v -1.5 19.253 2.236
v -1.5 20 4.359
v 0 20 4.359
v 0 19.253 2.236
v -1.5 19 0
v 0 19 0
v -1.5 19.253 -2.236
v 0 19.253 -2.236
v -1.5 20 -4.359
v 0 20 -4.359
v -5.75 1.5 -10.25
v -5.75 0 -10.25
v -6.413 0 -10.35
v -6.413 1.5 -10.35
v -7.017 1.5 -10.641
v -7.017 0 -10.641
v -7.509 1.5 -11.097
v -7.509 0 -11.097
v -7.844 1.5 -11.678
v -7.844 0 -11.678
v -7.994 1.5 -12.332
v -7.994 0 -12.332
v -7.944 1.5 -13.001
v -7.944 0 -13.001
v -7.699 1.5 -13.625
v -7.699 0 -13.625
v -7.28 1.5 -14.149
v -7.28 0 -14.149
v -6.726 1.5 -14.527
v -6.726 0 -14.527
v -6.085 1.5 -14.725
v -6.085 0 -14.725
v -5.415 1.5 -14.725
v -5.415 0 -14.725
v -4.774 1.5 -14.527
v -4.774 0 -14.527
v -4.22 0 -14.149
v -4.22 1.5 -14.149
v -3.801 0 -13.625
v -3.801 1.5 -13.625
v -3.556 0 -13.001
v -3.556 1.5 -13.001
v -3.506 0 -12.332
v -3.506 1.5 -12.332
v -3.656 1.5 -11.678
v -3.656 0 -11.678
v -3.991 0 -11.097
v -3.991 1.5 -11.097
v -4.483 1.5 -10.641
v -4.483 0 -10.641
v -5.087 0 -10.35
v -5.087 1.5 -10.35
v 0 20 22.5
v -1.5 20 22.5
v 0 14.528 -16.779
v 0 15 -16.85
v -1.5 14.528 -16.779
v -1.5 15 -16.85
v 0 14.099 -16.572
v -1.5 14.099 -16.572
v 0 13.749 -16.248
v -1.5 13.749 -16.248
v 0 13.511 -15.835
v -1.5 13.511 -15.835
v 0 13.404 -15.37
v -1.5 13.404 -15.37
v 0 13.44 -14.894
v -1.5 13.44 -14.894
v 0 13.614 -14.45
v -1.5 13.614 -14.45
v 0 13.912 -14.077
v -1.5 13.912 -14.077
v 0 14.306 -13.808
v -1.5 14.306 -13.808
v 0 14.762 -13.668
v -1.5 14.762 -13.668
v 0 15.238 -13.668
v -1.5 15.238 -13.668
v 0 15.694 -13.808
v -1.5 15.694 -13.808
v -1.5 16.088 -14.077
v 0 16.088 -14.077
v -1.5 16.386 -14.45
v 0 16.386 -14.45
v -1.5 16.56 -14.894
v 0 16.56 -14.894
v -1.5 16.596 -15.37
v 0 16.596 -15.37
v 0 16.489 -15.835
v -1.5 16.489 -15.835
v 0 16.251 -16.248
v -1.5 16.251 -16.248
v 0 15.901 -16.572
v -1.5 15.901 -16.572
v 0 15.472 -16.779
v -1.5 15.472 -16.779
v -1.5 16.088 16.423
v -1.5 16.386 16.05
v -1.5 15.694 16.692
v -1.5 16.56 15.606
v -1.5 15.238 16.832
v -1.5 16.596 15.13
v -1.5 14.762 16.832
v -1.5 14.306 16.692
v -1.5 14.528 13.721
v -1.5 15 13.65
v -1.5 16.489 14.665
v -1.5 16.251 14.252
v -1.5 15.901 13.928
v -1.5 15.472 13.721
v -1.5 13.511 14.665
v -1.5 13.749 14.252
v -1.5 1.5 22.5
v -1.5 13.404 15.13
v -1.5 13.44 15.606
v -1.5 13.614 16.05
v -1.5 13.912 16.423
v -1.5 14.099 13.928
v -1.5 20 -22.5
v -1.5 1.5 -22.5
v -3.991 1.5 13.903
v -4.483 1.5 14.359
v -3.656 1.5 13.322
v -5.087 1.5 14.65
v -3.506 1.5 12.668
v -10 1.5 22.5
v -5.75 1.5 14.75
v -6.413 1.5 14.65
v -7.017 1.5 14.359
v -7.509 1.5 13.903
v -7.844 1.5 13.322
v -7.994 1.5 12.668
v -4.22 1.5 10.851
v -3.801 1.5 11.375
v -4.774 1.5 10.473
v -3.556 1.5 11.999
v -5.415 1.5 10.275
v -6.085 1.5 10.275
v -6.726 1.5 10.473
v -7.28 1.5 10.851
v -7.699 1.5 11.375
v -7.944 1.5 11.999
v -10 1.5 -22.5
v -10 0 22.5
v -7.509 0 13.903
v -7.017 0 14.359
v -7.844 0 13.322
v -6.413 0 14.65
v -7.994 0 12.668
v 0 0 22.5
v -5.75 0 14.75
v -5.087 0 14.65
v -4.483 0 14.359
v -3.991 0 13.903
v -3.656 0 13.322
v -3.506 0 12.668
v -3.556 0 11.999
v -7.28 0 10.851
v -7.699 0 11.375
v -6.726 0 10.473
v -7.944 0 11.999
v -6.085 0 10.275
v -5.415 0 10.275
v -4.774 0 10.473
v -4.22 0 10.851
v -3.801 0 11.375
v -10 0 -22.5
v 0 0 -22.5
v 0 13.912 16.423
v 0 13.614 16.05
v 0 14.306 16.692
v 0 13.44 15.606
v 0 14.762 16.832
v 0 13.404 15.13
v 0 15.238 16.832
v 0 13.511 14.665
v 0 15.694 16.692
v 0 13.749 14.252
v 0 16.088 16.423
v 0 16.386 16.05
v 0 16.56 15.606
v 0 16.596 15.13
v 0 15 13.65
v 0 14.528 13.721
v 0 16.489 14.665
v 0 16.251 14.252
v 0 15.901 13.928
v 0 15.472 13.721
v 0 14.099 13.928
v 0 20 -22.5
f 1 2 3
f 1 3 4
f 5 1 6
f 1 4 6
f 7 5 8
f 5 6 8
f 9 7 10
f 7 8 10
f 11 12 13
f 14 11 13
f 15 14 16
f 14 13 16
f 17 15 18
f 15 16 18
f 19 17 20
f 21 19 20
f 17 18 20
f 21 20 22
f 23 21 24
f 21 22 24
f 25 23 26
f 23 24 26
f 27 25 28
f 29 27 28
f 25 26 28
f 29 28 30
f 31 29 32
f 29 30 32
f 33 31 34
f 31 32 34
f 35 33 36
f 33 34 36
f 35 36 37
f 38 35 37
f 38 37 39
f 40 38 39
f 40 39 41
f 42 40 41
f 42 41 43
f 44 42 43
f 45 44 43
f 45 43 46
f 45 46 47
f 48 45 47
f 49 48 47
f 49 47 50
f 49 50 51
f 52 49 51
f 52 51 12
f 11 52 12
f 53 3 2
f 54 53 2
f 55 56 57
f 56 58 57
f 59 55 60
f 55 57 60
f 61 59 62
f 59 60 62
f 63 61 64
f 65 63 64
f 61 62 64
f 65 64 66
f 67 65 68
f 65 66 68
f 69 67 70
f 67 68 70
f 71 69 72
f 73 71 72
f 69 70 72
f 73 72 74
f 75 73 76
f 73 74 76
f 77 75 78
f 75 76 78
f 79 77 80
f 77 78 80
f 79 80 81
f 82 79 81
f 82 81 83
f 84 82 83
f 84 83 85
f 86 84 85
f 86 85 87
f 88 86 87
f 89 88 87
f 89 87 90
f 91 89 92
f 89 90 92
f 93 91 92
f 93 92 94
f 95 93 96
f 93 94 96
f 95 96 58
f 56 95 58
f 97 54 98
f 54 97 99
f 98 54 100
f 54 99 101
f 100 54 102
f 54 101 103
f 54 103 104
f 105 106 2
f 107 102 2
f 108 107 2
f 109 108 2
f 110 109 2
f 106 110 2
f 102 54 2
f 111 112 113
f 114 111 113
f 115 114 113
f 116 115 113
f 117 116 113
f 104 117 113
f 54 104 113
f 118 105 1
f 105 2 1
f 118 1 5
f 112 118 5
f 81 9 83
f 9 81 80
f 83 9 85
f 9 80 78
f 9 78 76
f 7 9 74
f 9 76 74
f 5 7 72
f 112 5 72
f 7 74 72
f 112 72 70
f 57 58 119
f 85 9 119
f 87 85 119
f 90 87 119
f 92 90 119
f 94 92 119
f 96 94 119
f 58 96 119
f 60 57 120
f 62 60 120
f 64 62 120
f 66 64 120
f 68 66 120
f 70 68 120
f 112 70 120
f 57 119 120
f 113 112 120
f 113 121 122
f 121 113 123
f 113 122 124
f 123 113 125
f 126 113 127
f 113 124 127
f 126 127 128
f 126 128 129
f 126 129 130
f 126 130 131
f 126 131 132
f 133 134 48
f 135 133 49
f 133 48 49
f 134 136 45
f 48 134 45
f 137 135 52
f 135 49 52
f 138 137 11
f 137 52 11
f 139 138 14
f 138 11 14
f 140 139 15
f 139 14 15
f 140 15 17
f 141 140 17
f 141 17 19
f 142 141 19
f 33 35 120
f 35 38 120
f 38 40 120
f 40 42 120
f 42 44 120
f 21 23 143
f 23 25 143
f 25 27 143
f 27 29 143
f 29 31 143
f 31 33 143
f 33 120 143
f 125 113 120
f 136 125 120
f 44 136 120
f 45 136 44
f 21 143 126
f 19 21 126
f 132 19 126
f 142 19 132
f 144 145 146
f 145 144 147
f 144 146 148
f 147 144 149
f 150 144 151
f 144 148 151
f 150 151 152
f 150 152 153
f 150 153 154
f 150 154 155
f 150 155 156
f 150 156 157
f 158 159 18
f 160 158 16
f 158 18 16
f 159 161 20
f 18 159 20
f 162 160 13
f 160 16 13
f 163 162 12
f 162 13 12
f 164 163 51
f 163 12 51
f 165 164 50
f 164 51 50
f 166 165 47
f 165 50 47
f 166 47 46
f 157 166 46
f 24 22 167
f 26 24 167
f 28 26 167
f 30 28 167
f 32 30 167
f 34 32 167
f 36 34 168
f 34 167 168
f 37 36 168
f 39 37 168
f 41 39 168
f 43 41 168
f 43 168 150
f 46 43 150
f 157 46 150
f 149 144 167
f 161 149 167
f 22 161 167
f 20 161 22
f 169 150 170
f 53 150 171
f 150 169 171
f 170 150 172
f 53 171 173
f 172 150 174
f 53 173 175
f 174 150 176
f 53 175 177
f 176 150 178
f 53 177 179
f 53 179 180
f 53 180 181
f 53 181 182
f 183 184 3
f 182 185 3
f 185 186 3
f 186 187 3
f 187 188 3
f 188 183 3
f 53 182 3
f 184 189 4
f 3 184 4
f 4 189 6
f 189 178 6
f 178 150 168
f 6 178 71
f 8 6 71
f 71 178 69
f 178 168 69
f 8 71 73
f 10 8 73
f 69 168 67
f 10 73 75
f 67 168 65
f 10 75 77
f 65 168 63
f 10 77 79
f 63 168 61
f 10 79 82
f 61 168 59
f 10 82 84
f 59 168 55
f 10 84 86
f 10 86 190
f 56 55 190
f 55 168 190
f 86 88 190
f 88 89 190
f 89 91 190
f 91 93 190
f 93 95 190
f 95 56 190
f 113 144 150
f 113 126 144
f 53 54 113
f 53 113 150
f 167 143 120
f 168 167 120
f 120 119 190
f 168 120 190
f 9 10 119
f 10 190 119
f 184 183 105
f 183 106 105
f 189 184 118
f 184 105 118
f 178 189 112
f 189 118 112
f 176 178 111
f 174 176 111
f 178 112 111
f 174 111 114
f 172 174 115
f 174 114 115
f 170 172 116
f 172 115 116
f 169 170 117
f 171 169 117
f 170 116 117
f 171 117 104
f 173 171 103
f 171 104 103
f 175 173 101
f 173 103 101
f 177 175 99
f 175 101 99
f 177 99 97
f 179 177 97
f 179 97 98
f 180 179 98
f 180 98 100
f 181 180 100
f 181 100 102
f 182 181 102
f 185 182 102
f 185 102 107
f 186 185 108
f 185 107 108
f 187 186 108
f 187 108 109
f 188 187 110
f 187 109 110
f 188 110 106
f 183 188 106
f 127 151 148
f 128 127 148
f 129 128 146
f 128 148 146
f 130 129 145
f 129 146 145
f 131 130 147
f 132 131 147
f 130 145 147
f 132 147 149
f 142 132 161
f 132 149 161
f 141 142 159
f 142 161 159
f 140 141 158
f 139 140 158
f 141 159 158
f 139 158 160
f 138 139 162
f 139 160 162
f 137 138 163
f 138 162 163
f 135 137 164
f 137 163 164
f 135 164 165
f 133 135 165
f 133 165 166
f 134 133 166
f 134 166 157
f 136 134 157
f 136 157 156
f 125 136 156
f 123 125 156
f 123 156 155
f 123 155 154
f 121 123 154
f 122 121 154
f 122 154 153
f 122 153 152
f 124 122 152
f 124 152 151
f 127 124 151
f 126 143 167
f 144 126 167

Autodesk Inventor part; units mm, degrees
ref_plane "YZ Plane" through (0, 0, 0) normal (1, 0, 0) x (0, 1, 0)
ref_plane "XZ Plane" through (0, 0, 0) normal (0, 1, 0) x (-1, 0, 0)
ref_plane "XY Plane" through (0, 0, 0) normal (0, 0, 1) x (1, 0, 0)
sketch "Náčrt1" plane through (0, 0, 0) normal (0, 0, 1) x (1, 0, 0)
  line L0 (-10, 0) -> (0, 0)
  line L1 (0, 0) -> (0, 20)
  line L2 (0, 20) -> (-1.5, 20)
  line L3 (-1.5, 20) -> (-1.5, 1.5)
  line L4 (-1.5, 1.5) -> (-10, 1.5)
  line L5 (-10, 1.5) -> (-10, 0)
  line L6 (-12, 0) -> (2, 0) projected
  line L7 (0, 24) -> (0, -4) projected
  point P0 (0, 0)
  dimension "d0" = 20
  dimension "d1" = 10
  dimension "d2" = 1.5
  dimension "d3" = 1.5
extrude "Vysunutí1" add sketch "Náčrt1" along normal mid plane 45
sketch "Náčrt2" plane through (-10, 1.5, 22.5) normal (0, 1, 0) x (1, 0, 0)
  line L0 (0, 0) -> (0, 45) projected
  line L1 (8.5, 0) -> (0, 0) projected
  line L2 (8.5, 45) -> (8.5, 0) projected
  line L3 (0, 45) -> (8.5, 45) projected
  point P0 (10, 22.5)
  point P1 (4.25, 35)
  point P2 (4.25, 10)
  point P3 (4.25, 0)
  dimension "d6" = 4.25
  dimension "d7" = 4.25
  dimension "d8" = 25
  dimension "d9" = 10
hole "Díra1" at (-5.75, 1.5, -12.5) at (-5.75, 1.5, 12.5) direction (0, -1, 0) diameter 4.5 end through all
sketch "Náčrt5" plane through (0, 0, 22.5) normal (1, 0, 0) x (0, 0, -1)
  line L0 (45, 20) -> (0, 20) projected
  line L1 (0, 0) -> (0, 20) projected
  line L2 (45, 0) -> (0, 0) projected
  line L3 (45, 20) -> (45, 0) projected
  line L4 (22.5, 0) -> (22.5, 47.1534) construction
  point P0 (22.5, 20)
  point P1 (37.75, 15)
  point P2 (7.25, 15)
  dimension "d41" = 30.5
  dimension "d42" = 5
  dimension "d43" = 47.1534
hole "Díra4" at (0, 15, -15.25) at (0, 15, 15.25) direction (-1, 0, 0) diameter 3.2 end through all
sketch "Náčrt6" plane through (0, 0, 22.5) normal (1, 0, 0) x (0, 0, -1)
  line L0 (22.5, 0) -> (22.5, 40) construction
  circle A0 centre (22.5, 29) radius 10
  point P0 (22.5, 19)
  point P1 (22.5, 20)
  dimension "d52" = 20
  dimension "d51" = 40
  dimension "d53" = 1
extrude "Vysunutí2" cut sketch "Náčrt6" against normal through all
properties part number "x_bracket_stepper" material "Hliník 6061"
